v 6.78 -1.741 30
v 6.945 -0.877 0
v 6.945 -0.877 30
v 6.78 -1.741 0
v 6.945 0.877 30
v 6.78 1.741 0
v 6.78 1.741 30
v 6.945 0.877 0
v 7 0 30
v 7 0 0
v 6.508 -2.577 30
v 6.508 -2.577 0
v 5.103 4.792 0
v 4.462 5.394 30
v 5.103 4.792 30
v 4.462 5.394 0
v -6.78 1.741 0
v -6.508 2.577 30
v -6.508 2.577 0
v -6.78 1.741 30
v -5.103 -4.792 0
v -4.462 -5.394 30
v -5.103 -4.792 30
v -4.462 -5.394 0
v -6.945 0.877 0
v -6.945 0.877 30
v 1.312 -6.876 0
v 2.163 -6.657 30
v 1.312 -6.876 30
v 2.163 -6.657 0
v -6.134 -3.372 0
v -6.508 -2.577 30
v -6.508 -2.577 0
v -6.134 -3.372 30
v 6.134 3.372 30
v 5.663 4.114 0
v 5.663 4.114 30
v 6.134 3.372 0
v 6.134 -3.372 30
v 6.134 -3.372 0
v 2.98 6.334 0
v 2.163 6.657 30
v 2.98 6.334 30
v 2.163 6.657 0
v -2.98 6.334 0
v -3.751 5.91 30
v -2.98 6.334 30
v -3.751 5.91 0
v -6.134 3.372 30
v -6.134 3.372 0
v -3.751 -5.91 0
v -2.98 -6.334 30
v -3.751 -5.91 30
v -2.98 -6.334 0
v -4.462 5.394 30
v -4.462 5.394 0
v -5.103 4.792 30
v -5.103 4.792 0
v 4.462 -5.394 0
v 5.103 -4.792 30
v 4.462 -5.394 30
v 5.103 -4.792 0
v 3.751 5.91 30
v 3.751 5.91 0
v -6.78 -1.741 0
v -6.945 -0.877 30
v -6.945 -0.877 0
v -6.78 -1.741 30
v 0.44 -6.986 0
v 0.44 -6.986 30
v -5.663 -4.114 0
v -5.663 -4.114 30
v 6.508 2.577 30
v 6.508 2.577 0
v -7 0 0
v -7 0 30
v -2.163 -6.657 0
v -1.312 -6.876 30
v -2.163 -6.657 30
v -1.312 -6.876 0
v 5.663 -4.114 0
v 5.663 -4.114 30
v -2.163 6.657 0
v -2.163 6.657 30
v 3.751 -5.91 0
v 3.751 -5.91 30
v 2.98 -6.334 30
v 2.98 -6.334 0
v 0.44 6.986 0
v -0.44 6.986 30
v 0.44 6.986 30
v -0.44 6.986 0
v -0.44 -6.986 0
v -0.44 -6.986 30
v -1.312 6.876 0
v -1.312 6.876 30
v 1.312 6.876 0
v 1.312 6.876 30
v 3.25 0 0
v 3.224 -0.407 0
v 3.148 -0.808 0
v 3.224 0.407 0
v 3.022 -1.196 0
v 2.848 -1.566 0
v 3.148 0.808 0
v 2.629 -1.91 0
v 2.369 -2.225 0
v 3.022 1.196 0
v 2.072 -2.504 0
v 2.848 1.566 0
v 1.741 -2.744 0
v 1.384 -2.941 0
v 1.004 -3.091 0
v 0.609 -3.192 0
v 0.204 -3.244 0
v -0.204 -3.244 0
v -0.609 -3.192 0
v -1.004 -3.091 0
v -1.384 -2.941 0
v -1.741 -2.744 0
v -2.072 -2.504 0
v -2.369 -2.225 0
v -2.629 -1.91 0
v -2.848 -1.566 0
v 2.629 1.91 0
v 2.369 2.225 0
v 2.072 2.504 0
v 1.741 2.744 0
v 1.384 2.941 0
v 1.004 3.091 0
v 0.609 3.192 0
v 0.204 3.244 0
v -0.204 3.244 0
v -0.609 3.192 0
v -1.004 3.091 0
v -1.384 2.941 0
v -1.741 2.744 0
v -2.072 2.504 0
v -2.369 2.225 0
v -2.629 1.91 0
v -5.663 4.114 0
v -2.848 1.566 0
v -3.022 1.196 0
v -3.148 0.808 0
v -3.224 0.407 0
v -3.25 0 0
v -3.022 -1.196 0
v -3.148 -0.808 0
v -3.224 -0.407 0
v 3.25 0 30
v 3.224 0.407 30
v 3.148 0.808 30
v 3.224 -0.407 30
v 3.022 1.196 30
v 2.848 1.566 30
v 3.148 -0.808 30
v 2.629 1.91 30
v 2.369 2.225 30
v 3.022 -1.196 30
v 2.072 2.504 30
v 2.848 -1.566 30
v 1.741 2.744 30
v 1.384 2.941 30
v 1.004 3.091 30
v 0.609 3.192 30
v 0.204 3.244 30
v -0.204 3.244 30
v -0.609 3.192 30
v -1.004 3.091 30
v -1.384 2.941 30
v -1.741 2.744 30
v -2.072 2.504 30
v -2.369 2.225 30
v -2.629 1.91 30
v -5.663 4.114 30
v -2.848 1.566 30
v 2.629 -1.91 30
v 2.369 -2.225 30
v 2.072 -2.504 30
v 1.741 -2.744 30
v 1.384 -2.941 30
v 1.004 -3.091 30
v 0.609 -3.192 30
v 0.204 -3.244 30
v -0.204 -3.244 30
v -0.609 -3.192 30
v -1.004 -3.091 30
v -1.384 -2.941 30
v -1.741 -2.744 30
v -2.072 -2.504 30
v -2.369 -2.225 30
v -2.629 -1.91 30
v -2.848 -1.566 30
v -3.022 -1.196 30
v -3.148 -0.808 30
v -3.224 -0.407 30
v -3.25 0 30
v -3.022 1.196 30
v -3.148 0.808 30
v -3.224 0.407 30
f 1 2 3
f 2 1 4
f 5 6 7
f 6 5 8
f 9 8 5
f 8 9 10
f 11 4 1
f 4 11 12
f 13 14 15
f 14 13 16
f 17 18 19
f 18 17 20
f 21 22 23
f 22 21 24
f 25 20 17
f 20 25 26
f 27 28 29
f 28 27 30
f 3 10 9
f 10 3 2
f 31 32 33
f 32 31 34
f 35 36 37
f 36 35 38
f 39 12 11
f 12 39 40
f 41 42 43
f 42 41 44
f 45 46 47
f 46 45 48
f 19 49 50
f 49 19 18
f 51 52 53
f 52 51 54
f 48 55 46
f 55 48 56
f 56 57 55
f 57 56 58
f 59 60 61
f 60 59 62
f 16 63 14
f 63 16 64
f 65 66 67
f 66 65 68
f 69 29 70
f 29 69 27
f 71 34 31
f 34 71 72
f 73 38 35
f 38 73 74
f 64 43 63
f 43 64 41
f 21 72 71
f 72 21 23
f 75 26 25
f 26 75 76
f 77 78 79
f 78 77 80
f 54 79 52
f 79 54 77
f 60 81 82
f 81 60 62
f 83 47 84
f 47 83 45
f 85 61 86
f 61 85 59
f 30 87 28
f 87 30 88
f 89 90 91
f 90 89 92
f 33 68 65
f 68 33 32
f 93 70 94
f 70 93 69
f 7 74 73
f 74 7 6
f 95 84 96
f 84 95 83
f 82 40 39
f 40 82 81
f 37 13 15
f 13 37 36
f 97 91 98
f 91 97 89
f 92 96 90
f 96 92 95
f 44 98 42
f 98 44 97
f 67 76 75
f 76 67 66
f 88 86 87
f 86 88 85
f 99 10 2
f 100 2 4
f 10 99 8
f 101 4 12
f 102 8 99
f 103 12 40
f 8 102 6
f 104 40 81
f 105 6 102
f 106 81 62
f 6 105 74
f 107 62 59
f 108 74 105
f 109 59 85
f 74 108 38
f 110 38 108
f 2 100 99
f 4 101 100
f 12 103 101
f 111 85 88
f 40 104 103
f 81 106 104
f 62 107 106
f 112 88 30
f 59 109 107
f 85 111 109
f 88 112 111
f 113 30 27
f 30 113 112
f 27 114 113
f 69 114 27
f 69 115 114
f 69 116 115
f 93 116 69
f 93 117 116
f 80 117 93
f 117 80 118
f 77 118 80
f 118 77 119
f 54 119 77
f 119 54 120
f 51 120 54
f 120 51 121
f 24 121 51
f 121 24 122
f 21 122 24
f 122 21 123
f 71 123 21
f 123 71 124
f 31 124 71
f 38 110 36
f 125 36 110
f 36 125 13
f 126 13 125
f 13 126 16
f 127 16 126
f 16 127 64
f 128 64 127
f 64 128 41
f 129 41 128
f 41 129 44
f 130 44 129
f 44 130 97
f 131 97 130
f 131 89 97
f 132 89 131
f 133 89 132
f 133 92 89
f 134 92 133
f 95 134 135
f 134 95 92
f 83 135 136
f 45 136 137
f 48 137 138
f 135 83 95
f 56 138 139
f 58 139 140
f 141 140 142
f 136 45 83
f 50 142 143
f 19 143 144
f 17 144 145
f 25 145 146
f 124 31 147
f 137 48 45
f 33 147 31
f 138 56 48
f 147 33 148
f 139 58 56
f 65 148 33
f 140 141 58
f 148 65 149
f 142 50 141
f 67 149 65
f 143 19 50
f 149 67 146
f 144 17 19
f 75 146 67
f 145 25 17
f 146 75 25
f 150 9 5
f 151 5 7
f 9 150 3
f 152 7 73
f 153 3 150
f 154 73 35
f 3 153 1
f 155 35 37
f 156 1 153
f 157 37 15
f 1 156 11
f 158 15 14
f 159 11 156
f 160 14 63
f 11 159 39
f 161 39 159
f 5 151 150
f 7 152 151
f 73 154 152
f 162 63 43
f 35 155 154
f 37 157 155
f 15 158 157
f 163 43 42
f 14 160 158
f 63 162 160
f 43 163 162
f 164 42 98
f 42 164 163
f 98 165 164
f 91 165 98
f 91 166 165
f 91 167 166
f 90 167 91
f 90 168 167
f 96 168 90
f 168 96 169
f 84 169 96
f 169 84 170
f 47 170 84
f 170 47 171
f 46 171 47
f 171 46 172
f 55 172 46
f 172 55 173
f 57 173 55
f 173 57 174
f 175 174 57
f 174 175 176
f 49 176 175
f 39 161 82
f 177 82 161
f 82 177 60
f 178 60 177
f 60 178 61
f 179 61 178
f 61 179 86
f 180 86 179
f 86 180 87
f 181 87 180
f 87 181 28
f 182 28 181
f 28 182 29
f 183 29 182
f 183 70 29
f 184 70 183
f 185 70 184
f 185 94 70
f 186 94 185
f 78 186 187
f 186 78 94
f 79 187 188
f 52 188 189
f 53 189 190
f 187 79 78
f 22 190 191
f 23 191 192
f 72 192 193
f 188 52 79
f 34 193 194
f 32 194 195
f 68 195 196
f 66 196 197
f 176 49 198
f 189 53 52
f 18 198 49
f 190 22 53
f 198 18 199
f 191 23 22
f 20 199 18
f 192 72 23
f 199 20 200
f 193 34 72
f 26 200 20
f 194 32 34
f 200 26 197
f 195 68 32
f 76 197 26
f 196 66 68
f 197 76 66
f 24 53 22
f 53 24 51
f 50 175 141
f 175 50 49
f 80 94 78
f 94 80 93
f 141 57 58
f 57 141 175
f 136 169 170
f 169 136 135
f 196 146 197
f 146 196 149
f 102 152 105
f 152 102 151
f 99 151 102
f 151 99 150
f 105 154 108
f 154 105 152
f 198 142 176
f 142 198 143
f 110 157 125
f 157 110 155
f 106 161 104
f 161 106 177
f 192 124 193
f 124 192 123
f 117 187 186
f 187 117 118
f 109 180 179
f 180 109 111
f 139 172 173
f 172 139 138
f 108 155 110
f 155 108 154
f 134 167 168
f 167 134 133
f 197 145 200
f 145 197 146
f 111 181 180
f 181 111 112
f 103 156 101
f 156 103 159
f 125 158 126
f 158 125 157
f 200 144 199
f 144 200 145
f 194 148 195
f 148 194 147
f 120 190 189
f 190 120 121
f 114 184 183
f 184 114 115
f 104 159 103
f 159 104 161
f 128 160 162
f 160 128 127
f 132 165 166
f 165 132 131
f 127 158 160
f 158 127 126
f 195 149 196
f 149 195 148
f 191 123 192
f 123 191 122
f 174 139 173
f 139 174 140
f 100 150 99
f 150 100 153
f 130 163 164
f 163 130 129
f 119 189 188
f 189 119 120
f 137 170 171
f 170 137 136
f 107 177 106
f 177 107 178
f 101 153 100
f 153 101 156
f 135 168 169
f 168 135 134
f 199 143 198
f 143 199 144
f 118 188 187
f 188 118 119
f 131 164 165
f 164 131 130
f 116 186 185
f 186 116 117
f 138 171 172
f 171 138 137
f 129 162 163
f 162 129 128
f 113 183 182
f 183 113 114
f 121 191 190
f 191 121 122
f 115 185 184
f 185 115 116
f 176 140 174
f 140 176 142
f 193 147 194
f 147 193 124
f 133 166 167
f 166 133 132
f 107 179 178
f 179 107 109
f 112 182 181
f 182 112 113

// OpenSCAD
$fn = 50;


difference() {
	union() {
		cylinder(h = 30, r = 7.0000000000);
	}
	union() {
		translate(v = [0, 0, -100]) {
			cylinder(h = 200, r = 3.2500000000);
		}
	}
}
